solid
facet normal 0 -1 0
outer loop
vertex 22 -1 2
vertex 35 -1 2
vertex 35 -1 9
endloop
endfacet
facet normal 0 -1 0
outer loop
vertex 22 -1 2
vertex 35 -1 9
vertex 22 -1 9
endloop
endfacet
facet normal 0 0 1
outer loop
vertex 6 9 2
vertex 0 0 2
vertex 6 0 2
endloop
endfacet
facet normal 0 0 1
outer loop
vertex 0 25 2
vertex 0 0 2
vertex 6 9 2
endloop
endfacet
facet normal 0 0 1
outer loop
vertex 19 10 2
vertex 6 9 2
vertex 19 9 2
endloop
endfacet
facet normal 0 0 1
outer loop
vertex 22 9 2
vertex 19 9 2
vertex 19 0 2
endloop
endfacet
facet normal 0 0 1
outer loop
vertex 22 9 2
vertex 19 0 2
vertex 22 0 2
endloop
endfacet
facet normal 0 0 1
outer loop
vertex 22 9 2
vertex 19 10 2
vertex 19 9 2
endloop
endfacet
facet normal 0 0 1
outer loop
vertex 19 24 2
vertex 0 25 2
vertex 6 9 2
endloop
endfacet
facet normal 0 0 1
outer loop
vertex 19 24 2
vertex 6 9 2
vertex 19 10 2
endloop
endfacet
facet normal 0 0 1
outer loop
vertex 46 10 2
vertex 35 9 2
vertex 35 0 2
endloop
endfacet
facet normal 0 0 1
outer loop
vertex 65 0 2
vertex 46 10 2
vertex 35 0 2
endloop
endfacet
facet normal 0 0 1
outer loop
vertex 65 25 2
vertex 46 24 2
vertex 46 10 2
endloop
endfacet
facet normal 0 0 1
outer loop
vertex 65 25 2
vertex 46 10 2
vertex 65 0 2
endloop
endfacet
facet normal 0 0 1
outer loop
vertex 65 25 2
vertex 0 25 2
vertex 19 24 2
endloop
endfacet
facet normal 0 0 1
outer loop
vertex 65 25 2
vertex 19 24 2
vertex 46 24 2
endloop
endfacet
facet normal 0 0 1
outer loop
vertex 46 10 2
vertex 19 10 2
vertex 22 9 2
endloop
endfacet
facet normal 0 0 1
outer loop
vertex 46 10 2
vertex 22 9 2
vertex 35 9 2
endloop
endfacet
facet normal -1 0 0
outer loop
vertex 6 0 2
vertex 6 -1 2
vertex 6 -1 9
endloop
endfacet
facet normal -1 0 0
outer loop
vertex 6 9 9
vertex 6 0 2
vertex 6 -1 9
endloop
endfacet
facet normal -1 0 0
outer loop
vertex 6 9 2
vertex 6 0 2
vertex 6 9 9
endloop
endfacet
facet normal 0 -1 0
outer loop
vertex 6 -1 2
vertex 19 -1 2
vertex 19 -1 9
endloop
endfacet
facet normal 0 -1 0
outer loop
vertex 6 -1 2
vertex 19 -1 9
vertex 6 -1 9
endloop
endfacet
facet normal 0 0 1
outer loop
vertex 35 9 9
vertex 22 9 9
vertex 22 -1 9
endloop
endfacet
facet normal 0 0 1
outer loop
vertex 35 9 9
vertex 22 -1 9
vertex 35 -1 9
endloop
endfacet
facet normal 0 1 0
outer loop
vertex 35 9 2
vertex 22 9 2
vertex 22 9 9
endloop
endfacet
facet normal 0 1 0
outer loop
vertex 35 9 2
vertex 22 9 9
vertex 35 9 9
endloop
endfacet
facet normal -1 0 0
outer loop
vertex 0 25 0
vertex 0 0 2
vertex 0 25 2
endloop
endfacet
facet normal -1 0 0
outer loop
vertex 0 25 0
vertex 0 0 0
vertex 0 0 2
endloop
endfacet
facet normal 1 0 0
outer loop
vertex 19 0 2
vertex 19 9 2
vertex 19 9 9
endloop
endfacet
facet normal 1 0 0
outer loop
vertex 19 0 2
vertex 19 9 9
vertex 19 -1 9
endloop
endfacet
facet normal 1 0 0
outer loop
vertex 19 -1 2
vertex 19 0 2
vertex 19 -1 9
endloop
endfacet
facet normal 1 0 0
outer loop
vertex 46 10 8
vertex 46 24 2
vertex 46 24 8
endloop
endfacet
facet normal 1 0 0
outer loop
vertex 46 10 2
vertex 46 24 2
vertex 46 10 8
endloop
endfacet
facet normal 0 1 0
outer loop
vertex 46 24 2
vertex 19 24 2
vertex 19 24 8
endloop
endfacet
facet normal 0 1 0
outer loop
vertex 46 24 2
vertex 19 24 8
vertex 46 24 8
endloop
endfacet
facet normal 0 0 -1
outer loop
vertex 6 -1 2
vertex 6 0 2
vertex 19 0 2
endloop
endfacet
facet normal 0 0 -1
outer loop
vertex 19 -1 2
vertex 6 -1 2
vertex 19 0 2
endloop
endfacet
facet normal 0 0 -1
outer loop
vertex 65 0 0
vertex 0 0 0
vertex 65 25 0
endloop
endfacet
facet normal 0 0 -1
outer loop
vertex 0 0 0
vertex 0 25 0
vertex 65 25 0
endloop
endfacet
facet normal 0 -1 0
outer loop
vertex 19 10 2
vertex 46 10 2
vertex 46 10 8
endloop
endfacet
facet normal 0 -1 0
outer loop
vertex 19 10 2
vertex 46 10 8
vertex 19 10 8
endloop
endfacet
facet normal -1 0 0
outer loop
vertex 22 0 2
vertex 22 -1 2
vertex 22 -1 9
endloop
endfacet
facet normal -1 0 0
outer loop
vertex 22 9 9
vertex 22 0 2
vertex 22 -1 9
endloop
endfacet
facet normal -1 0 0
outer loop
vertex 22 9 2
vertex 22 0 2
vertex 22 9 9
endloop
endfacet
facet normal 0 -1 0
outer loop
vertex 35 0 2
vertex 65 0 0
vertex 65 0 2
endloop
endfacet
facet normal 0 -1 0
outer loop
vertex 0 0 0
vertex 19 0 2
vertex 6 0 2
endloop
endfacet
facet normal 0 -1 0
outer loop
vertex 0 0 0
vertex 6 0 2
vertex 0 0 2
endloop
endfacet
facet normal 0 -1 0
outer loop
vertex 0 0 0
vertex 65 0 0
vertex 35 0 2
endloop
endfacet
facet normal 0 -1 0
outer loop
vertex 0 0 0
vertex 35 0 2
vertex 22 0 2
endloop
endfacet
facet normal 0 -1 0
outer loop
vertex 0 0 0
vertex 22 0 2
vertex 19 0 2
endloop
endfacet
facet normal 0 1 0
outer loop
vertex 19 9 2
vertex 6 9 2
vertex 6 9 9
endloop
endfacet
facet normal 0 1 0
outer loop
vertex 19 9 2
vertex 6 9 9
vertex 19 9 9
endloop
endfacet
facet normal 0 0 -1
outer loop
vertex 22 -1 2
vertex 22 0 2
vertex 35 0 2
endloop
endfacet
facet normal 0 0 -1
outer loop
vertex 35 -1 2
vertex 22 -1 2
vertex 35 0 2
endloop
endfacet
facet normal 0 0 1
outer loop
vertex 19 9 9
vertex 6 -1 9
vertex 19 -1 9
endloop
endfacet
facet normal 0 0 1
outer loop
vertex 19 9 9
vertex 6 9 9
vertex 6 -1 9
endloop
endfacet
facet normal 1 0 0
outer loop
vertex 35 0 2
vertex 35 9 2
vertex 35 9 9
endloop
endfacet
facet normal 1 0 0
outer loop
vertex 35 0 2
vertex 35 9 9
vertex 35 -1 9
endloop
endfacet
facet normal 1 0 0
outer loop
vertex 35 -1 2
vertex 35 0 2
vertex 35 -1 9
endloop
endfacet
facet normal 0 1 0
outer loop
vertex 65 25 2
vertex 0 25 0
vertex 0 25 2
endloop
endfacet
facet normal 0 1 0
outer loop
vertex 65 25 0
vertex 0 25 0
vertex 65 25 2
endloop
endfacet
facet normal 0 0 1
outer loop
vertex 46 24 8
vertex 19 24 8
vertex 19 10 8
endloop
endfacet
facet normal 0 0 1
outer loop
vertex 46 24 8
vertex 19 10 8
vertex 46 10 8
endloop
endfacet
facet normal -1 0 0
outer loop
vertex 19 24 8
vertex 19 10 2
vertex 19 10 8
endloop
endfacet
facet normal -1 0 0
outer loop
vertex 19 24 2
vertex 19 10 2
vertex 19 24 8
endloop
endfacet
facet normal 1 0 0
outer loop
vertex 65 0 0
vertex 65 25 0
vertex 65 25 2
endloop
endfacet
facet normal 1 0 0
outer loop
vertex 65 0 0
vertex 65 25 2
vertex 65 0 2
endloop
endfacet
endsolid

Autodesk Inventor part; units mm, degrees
ref_plane "YZ Plane" through (0, 0, 0) normal (1, 0, 0) x (0, 1, 0)
ref_plane "XZ Plane" through (0, 0, 0) normal (0, 1, 0) x (-1, 0, 0)
ref_plane "XY Plane" through (0, 0, 0) normal (0, 0, 1) x (1, 0, 0)
sketch "Esquisse1" plane through (0, 0, 0) normal (0, 0, 1) x (1, 0, 0)
  line L0 (0, 25) -> (65, 25)
  line L1 (65, 25) -> (65, 0)
  line L2 (65, 0) -> (0, 0)
  line L3 (0, 0) -> (0, 25)
  line L4 (-13, 0) -> (78, 0) projected
  line L5 (0, -5) -> (0, 30) projected
  point P0 (0, 0)
  dimension "d0" = 25
  dimension "d1" = 65
extrude "Extrusion1" add sketch "Esquisse1" along normal blind 2
sketch "Esquisse2" plane through (0, 0, 2) normal (0, 0, 1) x (1, 0, 0)
  line L0 (19, 24) -> (46, 24)
  line L1 (46, 24) -> (46, 10)
  line L2 (46, 10) -> (19, 10)
  line L3 (19, 10) -> (19, 24)
  line L4 (65, 0) -> (65, 25) projected
  line L5 (65, 25) -> (0, 25) projected
  line L6 (0, 0) -> (65, 0) projected
  dimension "d4" = 27
  dimension "d6" = 19
  dimension "d11" = 10
  dimension "d12" = 1
extrude "Extrusion2" add sketch "Esquisse2" along normal blind 6
sketch "Esquisse3" plane through (0, 0, 2) normal (0, 0, 1) x (1, 0, 0)
  line L0 (6, 9) -> (19, 9)
  line L1 (19, 9) -> (19, -1)
  line L2 (19, -1) -> (6, -1)
  line L3 (6, -1) -> (6, 9)
  line L4 (0, 25) -> (0, 0) projected
  line L5 (0, 0) -> (65, 0) projected
  line L6 (22, 9) -> (35, 9)
  line L7 (35, 9) -> (35, -1)
  line L8 (35, -1) -> (22, -1)
  line L9 (22, -1) -> (22, 9)
  dimension "d10" = 10
  dimension "d13" = 13
  dimension "d14" = 6
  dimension "d15" = 1
  dimension "d16" = 10
  dimension "d17" = 13
  dimension "d18" = 3
  dimension "d19" = 1
extrude "Extrusion3" add sketch "Esquisse3" along normal blind 7
equation "\"d16\" = d10"
equation "\"d17\" = d13"
equation "\"d19\" = d15"
properties part number "Power"
